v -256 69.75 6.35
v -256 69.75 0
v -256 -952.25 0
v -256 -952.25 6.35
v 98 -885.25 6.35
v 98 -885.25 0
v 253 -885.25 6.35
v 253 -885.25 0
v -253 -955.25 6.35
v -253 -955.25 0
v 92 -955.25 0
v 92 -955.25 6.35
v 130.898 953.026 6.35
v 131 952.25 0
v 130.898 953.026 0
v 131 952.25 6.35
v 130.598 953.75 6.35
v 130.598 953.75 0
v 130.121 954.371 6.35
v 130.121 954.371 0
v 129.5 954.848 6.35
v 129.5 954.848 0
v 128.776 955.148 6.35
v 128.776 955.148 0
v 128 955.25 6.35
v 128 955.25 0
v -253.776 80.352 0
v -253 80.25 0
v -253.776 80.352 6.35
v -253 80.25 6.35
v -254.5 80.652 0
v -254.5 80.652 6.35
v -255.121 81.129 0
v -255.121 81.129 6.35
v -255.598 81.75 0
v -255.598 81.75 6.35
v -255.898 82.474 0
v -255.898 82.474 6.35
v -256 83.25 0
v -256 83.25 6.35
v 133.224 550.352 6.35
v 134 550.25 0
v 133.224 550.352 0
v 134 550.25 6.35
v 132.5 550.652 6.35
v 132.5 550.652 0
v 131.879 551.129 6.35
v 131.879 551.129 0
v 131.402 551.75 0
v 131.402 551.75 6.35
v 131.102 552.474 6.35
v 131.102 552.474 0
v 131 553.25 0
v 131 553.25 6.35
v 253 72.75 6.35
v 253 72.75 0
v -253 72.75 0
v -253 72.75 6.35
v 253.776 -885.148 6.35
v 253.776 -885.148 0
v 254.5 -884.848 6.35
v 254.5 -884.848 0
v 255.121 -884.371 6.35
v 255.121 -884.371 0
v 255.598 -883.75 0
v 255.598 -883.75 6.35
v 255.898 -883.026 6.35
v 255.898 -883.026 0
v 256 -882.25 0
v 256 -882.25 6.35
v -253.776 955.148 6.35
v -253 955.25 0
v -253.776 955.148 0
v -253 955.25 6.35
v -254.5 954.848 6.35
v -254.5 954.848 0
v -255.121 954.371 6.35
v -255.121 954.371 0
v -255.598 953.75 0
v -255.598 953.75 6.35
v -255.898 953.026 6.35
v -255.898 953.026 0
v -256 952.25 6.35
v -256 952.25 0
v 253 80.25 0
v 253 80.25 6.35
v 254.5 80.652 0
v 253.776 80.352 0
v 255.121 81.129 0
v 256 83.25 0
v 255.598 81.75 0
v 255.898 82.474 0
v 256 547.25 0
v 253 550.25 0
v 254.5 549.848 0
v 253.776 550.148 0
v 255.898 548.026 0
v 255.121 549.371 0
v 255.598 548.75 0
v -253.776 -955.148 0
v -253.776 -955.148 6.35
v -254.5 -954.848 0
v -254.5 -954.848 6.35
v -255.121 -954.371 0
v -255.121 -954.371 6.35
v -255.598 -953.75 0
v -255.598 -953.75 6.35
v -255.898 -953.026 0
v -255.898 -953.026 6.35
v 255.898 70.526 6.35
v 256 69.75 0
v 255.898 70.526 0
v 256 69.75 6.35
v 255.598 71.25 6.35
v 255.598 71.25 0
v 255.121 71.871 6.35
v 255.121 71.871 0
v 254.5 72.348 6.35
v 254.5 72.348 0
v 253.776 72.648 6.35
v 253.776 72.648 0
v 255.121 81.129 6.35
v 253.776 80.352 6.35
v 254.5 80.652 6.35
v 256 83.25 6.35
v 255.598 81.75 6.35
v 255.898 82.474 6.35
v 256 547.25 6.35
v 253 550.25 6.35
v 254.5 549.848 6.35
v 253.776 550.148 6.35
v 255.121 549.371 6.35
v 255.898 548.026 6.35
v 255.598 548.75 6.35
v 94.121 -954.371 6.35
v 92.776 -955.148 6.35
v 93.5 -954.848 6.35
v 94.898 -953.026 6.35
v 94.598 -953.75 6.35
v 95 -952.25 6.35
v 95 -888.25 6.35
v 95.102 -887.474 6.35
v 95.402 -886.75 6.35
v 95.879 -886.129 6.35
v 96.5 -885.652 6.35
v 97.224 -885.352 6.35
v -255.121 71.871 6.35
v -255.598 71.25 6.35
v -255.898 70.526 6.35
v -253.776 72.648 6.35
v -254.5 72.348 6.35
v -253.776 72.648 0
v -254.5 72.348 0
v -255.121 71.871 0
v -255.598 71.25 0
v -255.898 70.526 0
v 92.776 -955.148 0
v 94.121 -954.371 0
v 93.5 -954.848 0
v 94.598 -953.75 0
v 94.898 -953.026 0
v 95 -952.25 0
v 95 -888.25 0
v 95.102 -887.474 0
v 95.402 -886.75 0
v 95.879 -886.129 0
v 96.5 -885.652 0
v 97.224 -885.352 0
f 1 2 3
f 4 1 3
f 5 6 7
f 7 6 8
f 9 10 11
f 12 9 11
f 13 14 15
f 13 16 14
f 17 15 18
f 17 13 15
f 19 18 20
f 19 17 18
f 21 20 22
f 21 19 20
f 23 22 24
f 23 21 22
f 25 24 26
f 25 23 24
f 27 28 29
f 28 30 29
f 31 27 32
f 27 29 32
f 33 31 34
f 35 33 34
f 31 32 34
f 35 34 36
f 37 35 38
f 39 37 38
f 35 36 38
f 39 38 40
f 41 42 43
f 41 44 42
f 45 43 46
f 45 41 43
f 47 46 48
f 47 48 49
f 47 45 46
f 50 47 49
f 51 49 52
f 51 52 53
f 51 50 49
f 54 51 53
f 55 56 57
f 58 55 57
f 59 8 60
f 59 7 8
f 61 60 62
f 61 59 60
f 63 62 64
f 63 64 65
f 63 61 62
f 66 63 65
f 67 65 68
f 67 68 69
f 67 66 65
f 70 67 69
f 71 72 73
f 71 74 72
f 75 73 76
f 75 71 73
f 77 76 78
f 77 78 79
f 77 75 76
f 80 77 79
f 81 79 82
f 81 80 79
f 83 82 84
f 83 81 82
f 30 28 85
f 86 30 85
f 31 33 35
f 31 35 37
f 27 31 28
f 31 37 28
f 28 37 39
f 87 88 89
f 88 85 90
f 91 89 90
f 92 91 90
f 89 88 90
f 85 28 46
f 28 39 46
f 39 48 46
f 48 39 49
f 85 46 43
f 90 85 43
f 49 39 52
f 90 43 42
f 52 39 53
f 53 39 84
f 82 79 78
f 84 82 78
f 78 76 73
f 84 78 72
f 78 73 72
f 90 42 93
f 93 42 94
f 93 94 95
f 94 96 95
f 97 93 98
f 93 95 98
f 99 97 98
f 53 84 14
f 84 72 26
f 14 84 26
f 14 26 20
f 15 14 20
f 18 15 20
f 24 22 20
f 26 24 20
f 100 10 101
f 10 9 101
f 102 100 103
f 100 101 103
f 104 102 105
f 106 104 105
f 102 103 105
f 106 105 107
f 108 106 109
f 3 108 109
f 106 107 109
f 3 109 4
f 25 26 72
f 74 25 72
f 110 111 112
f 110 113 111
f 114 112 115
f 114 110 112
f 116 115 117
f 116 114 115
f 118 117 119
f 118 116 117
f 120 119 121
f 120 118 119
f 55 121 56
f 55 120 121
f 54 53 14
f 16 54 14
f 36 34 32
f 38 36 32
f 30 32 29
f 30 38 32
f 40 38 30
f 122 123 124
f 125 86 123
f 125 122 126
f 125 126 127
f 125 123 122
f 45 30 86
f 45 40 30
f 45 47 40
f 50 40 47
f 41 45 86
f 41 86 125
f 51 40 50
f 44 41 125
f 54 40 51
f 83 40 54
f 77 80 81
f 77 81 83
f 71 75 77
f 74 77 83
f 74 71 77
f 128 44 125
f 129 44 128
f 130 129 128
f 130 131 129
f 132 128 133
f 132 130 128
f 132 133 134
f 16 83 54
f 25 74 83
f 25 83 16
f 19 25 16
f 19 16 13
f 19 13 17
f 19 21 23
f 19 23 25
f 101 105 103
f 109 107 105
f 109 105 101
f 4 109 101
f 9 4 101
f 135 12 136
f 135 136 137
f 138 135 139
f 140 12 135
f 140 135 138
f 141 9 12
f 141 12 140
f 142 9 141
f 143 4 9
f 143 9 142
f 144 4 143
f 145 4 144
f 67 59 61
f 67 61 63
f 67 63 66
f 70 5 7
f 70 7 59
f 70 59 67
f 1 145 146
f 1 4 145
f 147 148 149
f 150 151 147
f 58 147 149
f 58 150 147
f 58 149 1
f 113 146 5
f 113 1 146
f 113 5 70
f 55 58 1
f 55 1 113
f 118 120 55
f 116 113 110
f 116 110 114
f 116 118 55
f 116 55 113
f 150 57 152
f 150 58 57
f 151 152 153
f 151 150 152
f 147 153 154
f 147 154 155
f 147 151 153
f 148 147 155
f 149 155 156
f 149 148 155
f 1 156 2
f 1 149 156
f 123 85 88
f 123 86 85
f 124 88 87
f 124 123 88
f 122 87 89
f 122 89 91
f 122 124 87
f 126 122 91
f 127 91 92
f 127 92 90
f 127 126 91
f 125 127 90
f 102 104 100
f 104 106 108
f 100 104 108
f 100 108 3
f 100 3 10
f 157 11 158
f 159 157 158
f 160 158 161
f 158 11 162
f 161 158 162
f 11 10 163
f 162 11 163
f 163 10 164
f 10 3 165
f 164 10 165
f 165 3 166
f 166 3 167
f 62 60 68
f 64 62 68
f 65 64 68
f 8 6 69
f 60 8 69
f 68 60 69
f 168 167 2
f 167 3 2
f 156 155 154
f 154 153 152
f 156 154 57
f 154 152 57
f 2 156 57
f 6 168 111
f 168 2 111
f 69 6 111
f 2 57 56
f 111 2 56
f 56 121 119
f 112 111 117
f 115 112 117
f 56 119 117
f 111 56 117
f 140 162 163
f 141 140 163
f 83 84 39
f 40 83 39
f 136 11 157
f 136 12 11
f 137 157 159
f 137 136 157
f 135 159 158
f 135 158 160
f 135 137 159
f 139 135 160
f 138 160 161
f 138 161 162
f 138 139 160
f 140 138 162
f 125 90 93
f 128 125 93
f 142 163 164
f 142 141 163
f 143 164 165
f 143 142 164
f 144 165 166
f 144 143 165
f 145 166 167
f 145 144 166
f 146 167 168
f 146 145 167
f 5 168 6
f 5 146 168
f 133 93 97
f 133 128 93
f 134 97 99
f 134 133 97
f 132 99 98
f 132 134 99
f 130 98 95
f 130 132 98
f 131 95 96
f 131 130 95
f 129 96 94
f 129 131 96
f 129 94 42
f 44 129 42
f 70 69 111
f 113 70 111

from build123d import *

# Parameters (mm, degrees)
F1_DEPTH = 6.35
F2_DEPTH = 6.35
F3_R     = 3
F3_2_R   = 3


with BuildPart() as f1:
    # F0 (on Top) → F1 (new body)
    with BuildSketch(Plane.XY):
        Polygon((-256, 80.25), (256, 80.25), (256, 550.25), (131, 550.25), (131, 955.25), (-256, 955.25), align=None)
    extrude(amount=F1_DEPTH)

    # F3#2
    f3_2_edges = [f1.edges().sort_by_distance(p)[0] for p in [
        (-256, 80.25, 3.175),
        (256, 80.25, 3.175),
        (256, 550.25, 3.175),
        (131, 955.25, 3.175),
        (131, 550.25, 3.175),
        (-256, 955.25, 3.175),
    ]]
    fillet(f3_2_edges, radius=F3_2_R)


with BuildPart() as f2:
    # F0 (on Top) → F2 (new body)
    with BuildSketch(Plane.XY):
        Polygon((-256, -955.25), (95, -955.25), (95, -885.25), (256, -885.25), (256, 72.75), (-256, 72.75), align=None)
    extrude(amount=F2_DEPTH)

    # F3
    f3_edges = [f2.edges().sort_by_distance(p)[0] for p in [
        (95, -885.25, 3.175),
        (256, -885.25, 3.175),
        (95, -955.25, 3.175),
        (-256, -955.25, 3.175),
        (256, 72.75, 3.175),
        (-256, 72.75, 3.175),
    ]]
    fillet(f3_edges, radius=F3_R)


solid = Compound([f1.part, f2.part])
